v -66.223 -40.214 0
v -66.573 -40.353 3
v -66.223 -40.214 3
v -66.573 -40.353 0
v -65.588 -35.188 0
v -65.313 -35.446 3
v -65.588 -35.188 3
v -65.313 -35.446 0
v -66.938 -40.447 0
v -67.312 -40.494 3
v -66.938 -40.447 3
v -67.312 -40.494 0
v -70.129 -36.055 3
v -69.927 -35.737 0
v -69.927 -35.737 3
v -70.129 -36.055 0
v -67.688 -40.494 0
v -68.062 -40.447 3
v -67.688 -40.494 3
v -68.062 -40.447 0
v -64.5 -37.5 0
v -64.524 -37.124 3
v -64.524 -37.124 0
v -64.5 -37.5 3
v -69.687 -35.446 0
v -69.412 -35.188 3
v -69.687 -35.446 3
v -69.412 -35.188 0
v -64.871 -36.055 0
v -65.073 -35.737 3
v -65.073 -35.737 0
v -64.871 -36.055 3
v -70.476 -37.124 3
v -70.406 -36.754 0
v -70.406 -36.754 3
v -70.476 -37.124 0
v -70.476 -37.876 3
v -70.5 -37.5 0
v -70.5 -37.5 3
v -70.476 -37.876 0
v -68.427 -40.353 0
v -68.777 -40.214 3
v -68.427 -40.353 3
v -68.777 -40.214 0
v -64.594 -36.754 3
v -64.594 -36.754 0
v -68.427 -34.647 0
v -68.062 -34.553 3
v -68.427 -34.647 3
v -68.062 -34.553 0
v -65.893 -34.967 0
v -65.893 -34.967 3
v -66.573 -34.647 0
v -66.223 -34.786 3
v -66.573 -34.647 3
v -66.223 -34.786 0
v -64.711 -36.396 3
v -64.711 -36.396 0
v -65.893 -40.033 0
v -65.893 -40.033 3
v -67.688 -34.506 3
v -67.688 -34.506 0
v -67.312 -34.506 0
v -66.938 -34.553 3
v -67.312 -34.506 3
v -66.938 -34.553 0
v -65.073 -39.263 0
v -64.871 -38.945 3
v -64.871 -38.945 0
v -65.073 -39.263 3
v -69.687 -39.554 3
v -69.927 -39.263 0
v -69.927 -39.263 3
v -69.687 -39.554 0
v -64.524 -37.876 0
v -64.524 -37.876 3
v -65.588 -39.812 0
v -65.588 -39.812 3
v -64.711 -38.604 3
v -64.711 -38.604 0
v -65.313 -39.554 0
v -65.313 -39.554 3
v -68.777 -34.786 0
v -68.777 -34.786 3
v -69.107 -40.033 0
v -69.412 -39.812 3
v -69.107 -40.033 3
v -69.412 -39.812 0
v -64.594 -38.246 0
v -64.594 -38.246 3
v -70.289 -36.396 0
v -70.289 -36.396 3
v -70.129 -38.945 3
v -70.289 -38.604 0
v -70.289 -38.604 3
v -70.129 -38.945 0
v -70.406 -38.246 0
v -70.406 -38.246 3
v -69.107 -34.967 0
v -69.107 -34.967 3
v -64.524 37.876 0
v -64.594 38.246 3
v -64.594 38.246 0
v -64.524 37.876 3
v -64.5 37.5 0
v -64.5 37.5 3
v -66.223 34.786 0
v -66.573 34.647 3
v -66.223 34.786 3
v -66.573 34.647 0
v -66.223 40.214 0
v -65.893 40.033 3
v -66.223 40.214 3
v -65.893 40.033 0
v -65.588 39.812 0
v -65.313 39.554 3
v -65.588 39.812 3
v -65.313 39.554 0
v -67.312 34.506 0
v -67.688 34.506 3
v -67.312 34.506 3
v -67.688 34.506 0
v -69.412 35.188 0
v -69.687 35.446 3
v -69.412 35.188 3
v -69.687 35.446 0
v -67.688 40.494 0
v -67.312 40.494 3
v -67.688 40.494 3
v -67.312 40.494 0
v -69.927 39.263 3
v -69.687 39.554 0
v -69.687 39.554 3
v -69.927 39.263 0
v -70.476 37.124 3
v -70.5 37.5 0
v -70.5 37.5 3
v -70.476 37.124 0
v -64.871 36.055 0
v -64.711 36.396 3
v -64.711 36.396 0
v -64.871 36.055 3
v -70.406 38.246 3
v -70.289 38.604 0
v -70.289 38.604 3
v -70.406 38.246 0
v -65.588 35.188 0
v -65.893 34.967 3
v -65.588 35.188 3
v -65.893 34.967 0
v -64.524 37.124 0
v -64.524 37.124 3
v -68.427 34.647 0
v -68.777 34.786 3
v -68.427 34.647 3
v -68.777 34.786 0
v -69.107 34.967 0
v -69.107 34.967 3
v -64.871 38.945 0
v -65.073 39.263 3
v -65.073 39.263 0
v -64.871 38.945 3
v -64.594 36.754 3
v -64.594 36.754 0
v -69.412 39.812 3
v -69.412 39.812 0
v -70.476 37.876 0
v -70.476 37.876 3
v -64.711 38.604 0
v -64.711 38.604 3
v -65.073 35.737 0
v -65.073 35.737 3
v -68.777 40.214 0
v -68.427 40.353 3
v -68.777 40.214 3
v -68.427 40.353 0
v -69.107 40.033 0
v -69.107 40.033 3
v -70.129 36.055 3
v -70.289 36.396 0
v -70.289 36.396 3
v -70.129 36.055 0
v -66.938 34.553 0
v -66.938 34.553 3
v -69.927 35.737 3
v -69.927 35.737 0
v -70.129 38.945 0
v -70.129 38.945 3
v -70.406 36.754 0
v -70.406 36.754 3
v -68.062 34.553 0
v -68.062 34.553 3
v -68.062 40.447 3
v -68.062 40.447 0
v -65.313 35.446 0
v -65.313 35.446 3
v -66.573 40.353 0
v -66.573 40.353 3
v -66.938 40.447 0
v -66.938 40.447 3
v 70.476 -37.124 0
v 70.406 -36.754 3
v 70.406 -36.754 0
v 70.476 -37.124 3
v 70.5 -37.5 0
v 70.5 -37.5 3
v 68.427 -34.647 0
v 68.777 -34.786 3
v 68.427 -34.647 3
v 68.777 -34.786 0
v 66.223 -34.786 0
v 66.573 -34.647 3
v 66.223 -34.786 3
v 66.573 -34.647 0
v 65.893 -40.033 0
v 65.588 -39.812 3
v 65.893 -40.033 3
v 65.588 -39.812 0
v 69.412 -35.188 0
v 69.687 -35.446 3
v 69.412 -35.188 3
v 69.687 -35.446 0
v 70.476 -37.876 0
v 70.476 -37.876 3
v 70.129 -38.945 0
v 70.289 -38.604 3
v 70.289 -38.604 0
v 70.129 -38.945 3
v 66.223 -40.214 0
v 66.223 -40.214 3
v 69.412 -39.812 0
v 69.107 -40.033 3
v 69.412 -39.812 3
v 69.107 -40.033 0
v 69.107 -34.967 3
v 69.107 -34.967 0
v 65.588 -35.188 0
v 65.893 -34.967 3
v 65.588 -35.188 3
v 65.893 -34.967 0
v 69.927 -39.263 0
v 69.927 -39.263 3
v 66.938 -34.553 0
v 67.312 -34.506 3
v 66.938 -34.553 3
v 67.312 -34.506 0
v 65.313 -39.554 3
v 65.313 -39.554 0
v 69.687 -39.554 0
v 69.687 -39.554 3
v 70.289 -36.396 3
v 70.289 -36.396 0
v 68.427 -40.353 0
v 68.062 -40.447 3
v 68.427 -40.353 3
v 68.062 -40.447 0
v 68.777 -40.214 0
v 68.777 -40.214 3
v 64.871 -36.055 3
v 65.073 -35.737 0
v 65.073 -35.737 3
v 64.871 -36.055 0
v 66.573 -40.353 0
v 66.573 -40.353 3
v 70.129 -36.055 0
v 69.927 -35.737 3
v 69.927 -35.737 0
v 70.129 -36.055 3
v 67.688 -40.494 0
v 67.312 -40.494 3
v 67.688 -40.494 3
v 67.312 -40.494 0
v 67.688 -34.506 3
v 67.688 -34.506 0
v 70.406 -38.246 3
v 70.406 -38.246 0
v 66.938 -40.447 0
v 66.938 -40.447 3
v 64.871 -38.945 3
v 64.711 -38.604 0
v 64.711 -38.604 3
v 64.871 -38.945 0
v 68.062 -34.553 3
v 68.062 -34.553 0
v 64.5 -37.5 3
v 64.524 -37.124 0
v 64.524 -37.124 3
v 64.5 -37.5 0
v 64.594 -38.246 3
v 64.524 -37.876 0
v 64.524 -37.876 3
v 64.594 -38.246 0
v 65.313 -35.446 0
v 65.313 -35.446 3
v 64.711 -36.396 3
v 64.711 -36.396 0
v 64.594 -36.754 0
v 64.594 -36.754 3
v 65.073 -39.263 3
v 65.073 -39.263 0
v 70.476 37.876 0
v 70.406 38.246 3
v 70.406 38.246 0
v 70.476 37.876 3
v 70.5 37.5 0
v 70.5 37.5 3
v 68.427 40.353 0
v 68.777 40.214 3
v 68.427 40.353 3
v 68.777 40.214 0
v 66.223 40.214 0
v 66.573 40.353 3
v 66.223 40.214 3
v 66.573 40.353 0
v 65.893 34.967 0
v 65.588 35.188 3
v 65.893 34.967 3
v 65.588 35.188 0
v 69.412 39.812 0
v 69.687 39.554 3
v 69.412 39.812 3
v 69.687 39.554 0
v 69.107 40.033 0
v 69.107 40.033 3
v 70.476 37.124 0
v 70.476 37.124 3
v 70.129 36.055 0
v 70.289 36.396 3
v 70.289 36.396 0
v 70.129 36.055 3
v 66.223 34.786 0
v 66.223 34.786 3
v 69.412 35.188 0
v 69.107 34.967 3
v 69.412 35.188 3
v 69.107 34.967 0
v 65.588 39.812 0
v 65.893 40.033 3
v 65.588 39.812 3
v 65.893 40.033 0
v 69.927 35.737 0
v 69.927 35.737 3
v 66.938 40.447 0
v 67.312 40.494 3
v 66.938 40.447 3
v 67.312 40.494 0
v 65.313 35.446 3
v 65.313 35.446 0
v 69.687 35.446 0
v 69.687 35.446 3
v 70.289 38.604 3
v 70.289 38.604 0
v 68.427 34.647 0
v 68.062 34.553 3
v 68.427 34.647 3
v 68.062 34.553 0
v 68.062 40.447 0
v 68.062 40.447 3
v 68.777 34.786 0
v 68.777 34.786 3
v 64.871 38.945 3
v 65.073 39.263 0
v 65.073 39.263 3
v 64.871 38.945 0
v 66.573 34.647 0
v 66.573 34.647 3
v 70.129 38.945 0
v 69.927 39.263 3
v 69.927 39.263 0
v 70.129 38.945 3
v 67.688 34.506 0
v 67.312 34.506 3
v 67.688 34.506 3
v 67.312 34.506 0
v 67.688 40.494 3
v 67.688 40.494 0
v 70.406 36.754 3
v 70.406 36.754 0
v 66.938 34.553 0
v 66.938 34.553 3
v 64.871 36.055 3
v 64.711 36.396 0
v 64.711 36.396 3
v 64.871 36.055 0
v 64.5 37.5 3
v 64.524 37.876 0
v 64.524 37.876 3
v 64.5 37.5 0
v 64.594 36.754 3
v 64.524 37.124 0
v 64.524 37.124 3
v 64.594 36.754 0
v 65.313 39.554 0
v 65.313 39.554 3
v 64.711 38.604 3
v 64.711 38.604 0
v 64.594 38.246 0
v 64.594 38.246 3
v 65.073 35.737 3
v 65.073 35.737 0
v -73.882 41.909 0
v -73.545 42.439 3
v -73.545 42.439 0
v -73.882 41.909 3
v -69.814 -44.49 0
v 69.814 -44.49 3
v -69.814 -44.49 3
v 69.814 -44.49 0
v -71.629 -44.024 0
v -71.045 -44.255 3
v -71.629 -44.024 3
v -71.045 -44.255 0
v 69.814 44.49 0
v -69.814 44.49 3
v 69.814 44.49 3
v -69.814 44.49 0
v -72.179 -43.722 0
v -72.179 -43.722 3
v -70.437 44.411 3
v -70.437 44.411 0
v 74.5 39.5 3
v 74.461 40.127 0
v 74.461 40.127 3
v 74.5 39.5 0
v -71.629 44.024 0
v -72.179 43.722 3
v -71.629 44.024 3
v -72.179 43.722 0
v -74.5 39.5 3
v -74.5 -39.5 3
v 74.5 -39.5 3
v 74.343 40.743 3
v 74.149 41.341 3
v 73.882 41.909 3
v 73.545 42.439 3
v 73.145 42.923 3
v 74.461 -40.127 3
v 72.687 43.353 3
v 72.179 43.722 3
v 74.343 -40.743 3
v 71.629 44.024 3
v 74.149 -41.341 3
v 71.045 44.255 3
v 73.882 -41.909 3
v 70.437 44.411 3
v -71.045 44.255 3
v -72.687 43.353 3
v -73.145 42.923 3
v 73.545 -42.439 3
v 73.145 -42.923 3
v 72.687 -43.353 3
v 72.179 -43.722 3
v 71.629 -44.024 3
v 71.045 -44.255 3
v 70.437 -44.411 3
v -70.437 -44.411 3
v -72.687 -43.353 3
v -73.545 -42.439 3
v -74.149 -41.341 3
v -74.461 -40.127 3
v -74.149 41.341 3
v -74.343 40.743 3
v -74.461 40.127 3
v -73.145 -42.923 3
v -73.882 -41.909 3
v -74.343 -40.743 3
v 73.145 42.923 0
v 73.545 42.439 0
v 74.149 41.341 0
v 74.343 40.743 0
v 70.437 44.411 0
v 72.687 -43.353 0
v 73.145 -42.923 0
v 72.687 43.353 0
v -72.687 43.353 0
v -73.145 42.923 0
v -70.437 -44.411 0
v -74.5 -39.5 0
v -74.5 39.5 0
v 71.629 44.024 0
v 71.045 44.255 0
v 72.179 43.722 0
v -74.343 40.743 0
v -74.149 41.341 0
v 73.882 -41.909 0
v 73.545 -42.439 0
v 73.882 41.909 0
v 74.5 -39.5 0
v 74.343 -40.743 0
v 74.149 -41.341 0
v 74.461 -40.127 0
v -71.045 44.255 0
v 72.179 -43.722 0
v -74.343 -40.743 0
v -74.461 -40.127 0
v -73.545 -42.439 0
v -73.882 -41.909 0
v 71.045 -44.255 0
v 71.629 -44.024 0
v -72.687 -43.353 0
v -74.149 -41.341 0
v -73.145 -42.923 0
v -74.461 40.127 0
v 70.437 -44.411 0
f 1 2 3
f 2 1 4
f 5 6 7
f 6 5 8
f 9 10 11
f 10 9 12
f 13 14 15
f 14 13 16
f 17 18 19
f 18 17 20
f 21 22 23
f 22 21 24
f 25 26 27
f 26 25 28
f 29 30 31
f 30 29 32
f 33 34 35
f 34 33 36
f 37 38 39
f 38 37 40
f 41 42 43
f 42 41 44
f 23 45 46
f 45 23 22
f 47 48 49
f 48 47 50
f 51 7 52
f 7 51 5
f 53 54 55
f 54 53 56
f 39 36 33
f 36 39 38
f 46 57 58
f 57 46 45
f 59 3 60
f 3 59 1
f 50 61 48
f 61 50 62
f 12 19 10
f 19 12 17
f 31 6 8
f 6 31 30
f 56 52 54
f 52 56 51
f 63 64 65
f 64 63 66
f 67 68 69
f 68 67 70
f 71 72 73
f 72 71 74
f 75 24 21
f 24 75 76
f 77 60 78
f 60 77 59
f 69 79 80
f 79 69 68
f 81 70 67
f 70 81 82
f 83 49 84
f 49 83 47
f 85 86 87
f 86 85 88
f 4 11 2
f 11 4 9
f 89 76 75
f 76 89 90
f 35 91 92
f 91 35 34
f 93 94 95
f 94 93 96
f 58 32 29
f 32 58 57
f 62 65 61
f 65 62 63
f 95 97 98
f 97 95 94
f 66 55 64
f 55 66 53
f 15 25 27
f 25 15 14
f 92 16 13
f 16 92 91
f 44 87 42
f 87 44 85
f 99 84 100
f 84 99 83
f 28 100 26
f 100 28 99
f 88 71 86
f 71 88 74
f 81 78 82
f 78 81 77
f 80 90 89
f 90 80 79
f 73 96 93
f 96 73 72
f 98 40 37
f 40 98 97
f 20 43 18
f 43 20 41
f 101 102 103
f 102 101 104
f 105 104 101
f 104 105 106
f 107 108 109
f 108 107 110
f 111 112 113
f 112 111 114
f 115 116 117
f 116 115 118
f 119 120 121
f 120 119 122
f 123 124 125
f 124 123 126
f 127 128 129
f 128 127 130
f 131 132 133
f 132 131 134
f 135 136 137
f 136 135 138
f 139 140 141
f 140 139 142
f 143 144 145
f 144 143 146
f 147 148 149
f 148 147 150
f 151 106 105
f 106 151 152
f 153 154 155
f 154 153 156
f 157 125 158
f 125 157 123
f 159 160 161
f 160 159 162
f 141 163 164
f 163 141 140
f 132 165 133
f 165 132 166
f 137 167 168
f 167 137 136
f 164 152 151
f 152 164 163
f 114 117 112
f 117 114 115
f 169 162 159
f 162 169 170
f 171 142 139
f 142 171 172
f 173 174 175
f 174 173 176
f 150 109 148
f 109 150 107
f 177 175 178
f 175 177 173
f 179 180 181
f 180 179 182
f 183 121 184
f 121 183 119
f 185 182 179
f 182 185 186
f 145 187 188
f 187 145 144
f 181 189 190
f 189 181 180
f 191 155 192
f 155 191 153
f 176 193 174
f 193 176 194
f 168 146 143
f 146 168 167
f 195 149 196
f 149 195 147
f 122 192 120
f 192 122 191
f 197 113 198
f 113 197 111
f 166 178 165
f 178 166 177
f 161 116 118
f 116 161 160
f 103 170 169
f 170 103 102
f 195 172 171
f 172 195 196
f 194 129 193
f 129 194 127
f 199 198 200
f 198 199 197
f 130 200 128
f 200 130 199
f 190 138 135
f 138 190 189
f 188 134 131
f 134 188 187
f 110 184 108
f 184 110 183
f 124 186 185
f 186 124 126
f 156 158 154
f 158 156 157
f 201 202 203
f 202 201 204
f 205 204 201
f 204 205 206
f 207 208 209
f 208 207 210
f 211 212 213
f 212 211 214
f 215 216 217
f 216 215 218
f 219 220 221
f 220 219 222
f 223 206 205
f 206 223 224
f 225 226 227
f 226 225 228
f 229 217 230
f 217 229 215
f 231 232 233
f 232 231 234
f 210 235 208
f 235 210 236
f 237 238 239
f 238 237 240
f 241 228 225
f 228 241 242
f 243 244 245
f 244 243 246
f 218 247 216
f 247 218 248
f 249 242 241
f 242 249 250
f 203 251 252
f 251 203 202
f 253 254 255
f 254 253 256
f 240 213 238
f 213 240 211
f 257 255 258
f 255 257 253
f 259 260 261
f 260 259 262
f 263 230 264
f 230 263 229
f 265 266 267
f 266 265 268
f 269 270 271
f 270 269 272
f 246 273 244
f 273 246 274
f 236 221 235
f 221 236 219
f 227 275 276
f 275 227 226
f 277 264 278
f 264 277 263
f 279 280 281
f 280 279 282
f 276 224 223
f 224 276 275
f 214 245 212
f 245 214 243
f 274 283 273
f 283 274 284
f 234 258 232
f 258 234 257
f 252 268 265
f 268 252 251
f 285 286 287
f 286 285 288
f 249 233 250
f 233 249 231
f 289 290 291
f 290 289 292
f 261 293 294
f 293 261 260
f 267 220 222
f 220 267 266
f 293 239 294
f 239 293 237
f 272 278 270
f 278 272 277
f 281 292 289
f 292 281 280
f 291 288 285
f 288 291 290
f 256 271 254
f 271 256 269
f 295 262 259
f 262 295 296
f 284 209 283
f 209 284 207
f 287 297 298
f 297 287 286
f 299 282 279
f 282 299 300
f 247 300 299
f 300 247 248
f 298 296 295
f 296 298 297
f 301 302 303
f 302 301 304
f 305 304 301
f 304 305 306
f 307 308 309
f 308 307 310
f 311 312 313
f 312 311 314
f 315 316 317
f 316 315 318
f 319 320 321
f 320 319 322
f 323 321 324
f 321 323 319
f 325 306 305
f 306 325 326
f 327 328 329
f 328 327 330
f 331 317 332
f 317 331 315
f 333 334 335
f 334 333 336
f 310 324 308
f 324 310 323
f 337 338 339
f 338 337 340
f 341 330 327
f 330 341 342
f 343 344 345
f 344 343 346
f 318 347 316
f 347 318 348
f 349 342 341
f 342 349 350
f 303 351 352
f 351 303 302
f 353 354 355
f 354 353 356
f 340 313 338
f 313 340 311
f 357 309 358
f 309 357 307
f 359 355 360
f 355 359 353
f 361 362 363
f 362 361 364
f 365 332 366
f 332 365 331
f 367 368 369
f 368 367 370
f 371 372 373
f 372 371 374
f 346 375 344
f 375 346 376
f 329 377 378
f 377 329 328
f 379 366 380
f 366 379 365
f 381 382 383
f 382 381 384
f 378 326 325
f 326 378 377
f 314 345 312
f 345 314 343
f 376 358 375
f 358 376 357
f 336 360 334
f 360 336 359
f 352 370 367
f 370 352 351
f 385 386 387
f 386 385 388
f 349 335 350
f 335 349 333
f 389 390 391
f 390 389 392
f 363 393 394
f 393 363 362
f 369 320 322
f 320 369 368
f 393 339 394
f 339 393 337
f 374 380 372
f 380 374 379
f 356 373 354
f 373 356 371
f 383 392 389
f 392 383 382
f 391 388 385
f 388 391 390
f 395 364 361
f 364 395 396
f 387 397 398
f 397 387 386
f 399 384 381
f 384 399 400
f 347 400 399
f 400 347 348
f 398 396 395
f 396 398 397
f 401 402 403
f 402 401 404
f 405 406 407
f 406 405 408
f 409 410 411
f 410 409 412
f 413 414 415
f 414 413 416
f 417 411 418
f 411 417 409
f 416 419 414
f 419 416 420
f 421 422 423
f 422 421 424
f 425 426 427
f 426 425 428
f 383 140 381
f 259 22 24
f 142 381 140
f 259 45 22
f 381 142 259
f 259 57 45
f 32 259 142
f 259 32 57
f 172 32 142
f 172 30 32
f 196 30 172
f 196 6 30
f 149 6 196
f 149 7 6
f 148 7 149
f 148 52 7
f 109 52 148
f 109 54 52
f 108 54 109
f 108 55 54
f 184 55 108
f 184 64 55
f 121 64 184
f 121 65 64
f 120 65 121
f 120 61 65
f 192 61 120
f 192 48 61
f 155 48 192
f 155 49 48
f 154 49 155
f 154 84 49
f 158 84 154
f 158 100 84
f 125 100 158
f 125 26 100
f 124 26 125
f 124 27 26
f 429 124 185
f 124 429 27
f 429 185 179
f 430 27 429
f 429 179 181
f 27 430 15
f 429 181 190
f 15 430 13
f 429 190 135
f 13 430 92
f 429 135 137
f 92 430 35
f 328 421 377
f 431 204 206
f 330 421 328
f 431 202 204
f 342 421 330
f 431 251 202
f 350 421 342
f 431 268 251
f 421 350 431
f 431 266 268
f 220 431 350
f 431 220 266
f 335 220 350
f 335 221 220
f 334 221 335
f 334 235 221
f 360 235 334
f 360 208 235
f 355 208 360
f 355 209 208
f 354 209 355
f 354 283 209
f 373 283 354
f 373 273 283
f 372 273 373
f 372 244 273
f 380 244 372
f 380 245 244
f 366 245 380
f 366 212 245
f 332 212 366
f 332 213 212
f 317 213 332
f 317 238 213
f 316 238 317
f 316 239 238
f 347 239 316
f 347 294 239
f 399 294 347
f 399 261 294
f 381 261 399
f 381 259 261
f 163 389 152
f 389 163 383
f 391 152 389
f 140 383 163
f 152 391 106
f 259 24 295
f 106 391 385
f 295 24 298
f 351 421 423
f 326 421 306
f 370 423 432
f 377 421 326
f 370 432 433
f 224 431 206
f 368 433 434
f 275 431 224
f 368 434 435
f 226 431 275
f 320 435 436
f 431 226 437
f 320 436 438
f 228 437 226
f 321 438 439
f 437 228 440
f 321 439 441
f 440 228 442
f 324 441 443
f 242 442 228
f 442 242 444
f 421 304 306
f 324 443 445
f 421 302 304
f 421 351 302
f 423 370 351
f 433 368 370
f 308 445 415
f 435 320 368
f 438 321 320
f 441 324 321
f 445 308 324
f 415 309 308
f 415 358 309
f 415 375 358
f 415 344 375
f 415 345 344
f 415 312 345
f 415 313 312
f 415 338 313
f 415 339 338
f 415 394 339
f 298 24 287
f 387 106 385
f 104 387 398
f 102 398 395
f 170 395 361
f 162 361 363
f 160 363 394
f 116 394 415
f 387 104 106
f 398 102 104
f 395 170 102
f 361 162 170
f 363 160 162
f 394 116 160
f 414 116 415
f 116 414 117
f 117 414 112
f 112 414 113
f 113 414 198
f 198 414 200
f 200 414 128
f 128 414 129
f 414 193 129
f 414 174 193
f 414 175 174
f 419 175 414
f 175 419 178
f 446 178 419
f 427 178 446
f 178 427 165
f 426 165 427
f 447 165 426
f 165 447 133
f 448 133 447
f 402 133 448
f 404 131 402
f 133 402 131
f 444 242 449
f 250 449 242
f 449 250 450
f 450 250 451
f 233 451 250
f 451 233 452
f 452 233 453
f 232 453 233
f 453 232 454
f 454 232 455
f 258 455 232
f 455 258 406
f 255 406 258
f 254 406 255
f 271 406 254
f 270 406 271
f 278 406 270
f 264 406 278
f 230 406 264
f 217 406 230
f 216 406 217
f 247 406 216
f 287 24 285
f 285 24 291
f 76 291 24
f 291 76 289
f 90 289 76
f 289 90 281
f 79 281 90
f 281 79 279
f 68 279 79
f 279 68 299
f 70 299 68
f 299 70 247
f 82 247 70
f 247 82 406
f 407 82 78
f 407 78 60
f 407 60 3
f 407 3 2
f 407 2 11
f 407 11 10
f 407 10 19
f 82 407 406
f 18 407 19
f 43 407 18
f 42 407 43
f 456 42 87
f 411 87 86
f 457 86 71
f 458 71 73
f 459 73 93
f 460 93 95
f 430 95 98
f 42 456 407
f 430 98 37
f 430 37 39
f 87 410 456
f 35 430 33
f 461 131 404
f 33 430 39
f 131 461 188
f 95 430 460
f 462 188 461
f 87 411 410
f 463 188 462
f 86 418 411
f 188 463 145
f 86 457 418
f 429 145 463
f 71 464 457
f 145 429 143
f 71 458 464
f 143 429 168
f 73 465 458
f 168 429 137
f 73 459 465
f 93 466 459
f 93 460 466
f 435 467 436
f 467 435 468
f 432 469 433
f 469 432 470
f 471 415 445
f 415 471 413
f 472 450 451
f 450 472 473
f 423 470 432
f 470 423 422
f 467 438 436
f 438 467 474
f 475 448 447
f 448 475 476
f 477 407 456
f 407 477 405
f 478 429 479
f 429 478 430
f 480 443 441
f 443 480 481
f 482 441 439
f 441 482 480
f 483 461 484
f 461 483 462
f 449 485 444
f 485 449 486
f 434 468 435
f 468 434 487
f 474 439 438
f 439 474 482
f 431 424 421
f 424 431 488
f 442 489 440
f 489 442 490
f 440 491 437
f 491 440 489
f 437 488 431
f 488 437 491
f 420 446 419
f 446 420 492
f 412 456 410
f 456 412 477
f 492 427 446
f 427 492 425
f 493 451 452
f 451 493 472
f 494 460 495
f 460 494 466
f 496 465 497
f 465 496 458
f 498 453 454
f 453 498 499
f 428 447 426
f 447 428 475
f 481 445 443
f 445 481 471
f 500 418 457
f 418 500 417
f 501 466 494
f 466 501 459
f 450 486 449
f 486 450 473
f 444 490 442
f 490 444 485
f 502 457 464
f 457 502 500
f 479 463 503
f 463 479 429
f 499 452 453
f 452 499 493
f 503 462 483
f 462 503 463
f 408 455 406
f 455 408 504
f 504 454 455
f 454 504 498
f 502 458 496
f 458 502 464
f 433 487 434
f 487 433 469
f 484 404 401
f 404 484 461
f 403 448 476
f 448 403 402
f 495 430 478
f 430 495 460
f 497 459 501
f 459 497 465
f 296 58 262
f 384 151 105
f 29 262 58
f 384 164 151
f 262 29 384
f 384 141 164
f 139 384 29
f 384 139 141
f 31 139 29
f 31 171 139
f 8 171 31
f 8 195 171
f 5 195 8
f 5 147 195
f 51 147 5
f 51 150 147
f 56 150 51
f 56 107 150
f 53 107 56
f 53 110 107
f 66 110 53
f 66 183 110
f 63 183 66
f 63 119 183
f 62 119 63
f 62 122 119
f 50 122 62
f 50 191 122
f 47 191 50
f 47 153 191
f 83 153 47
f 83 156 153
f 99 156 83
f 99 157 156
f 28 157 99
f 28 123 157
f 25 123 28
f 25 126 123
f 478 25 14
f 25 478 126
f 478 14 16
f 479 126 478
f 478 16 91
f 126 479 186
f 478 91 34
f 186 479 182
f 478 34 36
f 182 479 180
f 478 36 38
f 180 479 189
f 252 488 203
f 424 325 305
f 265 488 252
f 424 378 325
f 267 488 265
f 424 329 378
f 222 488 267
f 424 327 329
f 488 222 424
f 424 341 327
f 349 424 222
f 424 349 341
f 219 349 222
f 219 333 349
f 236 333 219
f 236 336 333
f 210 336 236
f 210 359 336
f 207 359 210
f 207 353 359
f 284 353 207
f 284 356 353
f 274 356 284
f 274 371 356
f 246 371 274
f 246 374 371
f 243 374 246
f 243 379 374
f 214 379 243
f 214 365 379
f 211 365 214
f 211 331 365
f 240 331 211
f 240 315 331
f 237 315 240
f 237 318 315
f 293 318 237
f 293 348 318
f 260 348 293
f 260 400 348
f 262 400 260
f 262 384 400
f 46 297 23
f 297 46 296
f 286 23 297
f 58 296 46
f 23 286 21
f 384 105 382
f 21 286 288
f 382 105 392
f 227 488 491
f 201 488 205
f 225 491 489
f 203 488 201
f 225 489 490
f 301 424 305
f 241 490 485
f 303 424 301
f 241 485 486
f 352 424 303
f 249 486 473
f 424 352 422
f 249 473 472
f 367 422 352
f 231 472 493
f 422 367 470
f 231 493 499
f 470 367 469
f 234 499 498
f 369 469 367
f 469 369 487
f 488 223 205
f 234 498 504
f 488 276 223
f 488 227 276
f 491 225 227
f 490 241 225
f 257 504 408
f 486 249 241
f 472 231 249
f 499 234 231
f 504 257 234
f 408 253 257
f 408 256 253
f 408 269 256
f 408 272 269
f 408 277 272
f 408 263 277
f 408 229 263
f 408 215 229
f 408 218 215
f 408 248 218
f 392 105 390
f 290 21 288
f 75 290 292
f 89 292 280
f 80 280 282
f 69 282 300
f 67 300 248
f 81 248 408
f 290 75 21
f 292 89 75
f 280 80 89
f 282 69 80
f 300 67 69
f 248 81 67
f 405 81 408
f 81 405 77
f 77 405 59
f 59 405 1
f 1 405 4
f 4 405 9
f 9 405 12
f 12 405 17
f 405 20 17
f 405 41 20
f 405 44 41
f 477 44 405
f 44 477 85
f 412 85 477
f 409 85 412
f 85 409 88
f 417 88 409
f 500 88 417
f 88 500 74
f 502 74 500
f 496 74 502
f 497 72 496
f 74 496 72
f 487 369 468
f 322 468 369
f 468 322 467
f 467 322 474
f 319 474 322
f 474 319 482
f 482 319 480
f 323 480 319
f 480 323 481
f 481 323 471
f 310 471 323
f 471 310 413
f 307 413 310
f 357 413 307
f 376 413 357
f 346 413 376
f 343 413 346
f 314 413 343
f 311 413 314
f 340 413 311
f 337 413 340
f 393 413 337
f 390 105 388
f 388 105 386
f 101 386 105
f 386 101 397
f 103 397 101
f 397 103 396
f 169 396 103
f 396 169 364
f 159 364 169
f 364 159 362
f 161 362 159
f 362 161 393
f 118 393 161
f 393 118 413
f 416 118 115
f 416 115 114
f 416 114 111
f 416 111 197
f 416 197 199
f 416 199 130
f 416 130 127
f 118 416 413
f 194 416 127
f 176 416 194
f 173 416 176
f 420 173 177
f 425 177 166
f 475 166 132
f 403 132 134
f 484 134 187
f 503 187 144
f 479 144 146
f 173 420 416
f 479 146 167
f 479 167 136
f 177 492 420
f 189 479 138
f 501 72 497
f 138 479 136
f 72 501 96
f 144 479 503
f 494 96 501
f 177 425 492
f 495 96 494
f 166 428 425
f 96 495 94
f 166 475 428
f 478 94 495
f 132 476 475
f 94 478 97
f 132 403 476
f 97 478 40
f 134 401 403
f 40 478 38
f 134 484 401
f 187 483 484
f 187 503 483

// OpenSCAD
$fn = 50;


difference() {
	union() {
		hull() {
			translate(v = [-69.5000000000, 39.5000000000, 0]) {
				cylinder(h = 3, r = 5);
			}
			translate(v = [69.5000000000, 39.5000000000, 0]) {
				cylinder(h = 3, r = 5);
			}
			translate(v = [-69.5000000000, -39.5000000000, 0]) {
				cylinder(h = 3, r = 5);
			}
			translate(v = [69.5000000000, -39.5000000000, 0]) {
				cylinder(h = 3, r = 5);
			}
		}
	}
	union() {
		translate(v = [-67.5000000000, -37.5000000000, -100.0000000000]) {
			cylinder(h = 200, r = 3.0000000000);
		}
		translate(v = [-67.5000000000, 37.5000000000, -100.0000000000]) {
			cylinder(h = 200, r = 3.0000000000);
		}
		translate(v = [67.5000000000, -37.5000000000, -100.0000000000]) {
			cylinder(h = 200, r = 3.0000000000);
		}
		translate(v = [67.5000000000, 37.5000000000, -100.0000000000]) {
			cylinder(h = 200, r = 3.0000000000);
		}
	}
}
